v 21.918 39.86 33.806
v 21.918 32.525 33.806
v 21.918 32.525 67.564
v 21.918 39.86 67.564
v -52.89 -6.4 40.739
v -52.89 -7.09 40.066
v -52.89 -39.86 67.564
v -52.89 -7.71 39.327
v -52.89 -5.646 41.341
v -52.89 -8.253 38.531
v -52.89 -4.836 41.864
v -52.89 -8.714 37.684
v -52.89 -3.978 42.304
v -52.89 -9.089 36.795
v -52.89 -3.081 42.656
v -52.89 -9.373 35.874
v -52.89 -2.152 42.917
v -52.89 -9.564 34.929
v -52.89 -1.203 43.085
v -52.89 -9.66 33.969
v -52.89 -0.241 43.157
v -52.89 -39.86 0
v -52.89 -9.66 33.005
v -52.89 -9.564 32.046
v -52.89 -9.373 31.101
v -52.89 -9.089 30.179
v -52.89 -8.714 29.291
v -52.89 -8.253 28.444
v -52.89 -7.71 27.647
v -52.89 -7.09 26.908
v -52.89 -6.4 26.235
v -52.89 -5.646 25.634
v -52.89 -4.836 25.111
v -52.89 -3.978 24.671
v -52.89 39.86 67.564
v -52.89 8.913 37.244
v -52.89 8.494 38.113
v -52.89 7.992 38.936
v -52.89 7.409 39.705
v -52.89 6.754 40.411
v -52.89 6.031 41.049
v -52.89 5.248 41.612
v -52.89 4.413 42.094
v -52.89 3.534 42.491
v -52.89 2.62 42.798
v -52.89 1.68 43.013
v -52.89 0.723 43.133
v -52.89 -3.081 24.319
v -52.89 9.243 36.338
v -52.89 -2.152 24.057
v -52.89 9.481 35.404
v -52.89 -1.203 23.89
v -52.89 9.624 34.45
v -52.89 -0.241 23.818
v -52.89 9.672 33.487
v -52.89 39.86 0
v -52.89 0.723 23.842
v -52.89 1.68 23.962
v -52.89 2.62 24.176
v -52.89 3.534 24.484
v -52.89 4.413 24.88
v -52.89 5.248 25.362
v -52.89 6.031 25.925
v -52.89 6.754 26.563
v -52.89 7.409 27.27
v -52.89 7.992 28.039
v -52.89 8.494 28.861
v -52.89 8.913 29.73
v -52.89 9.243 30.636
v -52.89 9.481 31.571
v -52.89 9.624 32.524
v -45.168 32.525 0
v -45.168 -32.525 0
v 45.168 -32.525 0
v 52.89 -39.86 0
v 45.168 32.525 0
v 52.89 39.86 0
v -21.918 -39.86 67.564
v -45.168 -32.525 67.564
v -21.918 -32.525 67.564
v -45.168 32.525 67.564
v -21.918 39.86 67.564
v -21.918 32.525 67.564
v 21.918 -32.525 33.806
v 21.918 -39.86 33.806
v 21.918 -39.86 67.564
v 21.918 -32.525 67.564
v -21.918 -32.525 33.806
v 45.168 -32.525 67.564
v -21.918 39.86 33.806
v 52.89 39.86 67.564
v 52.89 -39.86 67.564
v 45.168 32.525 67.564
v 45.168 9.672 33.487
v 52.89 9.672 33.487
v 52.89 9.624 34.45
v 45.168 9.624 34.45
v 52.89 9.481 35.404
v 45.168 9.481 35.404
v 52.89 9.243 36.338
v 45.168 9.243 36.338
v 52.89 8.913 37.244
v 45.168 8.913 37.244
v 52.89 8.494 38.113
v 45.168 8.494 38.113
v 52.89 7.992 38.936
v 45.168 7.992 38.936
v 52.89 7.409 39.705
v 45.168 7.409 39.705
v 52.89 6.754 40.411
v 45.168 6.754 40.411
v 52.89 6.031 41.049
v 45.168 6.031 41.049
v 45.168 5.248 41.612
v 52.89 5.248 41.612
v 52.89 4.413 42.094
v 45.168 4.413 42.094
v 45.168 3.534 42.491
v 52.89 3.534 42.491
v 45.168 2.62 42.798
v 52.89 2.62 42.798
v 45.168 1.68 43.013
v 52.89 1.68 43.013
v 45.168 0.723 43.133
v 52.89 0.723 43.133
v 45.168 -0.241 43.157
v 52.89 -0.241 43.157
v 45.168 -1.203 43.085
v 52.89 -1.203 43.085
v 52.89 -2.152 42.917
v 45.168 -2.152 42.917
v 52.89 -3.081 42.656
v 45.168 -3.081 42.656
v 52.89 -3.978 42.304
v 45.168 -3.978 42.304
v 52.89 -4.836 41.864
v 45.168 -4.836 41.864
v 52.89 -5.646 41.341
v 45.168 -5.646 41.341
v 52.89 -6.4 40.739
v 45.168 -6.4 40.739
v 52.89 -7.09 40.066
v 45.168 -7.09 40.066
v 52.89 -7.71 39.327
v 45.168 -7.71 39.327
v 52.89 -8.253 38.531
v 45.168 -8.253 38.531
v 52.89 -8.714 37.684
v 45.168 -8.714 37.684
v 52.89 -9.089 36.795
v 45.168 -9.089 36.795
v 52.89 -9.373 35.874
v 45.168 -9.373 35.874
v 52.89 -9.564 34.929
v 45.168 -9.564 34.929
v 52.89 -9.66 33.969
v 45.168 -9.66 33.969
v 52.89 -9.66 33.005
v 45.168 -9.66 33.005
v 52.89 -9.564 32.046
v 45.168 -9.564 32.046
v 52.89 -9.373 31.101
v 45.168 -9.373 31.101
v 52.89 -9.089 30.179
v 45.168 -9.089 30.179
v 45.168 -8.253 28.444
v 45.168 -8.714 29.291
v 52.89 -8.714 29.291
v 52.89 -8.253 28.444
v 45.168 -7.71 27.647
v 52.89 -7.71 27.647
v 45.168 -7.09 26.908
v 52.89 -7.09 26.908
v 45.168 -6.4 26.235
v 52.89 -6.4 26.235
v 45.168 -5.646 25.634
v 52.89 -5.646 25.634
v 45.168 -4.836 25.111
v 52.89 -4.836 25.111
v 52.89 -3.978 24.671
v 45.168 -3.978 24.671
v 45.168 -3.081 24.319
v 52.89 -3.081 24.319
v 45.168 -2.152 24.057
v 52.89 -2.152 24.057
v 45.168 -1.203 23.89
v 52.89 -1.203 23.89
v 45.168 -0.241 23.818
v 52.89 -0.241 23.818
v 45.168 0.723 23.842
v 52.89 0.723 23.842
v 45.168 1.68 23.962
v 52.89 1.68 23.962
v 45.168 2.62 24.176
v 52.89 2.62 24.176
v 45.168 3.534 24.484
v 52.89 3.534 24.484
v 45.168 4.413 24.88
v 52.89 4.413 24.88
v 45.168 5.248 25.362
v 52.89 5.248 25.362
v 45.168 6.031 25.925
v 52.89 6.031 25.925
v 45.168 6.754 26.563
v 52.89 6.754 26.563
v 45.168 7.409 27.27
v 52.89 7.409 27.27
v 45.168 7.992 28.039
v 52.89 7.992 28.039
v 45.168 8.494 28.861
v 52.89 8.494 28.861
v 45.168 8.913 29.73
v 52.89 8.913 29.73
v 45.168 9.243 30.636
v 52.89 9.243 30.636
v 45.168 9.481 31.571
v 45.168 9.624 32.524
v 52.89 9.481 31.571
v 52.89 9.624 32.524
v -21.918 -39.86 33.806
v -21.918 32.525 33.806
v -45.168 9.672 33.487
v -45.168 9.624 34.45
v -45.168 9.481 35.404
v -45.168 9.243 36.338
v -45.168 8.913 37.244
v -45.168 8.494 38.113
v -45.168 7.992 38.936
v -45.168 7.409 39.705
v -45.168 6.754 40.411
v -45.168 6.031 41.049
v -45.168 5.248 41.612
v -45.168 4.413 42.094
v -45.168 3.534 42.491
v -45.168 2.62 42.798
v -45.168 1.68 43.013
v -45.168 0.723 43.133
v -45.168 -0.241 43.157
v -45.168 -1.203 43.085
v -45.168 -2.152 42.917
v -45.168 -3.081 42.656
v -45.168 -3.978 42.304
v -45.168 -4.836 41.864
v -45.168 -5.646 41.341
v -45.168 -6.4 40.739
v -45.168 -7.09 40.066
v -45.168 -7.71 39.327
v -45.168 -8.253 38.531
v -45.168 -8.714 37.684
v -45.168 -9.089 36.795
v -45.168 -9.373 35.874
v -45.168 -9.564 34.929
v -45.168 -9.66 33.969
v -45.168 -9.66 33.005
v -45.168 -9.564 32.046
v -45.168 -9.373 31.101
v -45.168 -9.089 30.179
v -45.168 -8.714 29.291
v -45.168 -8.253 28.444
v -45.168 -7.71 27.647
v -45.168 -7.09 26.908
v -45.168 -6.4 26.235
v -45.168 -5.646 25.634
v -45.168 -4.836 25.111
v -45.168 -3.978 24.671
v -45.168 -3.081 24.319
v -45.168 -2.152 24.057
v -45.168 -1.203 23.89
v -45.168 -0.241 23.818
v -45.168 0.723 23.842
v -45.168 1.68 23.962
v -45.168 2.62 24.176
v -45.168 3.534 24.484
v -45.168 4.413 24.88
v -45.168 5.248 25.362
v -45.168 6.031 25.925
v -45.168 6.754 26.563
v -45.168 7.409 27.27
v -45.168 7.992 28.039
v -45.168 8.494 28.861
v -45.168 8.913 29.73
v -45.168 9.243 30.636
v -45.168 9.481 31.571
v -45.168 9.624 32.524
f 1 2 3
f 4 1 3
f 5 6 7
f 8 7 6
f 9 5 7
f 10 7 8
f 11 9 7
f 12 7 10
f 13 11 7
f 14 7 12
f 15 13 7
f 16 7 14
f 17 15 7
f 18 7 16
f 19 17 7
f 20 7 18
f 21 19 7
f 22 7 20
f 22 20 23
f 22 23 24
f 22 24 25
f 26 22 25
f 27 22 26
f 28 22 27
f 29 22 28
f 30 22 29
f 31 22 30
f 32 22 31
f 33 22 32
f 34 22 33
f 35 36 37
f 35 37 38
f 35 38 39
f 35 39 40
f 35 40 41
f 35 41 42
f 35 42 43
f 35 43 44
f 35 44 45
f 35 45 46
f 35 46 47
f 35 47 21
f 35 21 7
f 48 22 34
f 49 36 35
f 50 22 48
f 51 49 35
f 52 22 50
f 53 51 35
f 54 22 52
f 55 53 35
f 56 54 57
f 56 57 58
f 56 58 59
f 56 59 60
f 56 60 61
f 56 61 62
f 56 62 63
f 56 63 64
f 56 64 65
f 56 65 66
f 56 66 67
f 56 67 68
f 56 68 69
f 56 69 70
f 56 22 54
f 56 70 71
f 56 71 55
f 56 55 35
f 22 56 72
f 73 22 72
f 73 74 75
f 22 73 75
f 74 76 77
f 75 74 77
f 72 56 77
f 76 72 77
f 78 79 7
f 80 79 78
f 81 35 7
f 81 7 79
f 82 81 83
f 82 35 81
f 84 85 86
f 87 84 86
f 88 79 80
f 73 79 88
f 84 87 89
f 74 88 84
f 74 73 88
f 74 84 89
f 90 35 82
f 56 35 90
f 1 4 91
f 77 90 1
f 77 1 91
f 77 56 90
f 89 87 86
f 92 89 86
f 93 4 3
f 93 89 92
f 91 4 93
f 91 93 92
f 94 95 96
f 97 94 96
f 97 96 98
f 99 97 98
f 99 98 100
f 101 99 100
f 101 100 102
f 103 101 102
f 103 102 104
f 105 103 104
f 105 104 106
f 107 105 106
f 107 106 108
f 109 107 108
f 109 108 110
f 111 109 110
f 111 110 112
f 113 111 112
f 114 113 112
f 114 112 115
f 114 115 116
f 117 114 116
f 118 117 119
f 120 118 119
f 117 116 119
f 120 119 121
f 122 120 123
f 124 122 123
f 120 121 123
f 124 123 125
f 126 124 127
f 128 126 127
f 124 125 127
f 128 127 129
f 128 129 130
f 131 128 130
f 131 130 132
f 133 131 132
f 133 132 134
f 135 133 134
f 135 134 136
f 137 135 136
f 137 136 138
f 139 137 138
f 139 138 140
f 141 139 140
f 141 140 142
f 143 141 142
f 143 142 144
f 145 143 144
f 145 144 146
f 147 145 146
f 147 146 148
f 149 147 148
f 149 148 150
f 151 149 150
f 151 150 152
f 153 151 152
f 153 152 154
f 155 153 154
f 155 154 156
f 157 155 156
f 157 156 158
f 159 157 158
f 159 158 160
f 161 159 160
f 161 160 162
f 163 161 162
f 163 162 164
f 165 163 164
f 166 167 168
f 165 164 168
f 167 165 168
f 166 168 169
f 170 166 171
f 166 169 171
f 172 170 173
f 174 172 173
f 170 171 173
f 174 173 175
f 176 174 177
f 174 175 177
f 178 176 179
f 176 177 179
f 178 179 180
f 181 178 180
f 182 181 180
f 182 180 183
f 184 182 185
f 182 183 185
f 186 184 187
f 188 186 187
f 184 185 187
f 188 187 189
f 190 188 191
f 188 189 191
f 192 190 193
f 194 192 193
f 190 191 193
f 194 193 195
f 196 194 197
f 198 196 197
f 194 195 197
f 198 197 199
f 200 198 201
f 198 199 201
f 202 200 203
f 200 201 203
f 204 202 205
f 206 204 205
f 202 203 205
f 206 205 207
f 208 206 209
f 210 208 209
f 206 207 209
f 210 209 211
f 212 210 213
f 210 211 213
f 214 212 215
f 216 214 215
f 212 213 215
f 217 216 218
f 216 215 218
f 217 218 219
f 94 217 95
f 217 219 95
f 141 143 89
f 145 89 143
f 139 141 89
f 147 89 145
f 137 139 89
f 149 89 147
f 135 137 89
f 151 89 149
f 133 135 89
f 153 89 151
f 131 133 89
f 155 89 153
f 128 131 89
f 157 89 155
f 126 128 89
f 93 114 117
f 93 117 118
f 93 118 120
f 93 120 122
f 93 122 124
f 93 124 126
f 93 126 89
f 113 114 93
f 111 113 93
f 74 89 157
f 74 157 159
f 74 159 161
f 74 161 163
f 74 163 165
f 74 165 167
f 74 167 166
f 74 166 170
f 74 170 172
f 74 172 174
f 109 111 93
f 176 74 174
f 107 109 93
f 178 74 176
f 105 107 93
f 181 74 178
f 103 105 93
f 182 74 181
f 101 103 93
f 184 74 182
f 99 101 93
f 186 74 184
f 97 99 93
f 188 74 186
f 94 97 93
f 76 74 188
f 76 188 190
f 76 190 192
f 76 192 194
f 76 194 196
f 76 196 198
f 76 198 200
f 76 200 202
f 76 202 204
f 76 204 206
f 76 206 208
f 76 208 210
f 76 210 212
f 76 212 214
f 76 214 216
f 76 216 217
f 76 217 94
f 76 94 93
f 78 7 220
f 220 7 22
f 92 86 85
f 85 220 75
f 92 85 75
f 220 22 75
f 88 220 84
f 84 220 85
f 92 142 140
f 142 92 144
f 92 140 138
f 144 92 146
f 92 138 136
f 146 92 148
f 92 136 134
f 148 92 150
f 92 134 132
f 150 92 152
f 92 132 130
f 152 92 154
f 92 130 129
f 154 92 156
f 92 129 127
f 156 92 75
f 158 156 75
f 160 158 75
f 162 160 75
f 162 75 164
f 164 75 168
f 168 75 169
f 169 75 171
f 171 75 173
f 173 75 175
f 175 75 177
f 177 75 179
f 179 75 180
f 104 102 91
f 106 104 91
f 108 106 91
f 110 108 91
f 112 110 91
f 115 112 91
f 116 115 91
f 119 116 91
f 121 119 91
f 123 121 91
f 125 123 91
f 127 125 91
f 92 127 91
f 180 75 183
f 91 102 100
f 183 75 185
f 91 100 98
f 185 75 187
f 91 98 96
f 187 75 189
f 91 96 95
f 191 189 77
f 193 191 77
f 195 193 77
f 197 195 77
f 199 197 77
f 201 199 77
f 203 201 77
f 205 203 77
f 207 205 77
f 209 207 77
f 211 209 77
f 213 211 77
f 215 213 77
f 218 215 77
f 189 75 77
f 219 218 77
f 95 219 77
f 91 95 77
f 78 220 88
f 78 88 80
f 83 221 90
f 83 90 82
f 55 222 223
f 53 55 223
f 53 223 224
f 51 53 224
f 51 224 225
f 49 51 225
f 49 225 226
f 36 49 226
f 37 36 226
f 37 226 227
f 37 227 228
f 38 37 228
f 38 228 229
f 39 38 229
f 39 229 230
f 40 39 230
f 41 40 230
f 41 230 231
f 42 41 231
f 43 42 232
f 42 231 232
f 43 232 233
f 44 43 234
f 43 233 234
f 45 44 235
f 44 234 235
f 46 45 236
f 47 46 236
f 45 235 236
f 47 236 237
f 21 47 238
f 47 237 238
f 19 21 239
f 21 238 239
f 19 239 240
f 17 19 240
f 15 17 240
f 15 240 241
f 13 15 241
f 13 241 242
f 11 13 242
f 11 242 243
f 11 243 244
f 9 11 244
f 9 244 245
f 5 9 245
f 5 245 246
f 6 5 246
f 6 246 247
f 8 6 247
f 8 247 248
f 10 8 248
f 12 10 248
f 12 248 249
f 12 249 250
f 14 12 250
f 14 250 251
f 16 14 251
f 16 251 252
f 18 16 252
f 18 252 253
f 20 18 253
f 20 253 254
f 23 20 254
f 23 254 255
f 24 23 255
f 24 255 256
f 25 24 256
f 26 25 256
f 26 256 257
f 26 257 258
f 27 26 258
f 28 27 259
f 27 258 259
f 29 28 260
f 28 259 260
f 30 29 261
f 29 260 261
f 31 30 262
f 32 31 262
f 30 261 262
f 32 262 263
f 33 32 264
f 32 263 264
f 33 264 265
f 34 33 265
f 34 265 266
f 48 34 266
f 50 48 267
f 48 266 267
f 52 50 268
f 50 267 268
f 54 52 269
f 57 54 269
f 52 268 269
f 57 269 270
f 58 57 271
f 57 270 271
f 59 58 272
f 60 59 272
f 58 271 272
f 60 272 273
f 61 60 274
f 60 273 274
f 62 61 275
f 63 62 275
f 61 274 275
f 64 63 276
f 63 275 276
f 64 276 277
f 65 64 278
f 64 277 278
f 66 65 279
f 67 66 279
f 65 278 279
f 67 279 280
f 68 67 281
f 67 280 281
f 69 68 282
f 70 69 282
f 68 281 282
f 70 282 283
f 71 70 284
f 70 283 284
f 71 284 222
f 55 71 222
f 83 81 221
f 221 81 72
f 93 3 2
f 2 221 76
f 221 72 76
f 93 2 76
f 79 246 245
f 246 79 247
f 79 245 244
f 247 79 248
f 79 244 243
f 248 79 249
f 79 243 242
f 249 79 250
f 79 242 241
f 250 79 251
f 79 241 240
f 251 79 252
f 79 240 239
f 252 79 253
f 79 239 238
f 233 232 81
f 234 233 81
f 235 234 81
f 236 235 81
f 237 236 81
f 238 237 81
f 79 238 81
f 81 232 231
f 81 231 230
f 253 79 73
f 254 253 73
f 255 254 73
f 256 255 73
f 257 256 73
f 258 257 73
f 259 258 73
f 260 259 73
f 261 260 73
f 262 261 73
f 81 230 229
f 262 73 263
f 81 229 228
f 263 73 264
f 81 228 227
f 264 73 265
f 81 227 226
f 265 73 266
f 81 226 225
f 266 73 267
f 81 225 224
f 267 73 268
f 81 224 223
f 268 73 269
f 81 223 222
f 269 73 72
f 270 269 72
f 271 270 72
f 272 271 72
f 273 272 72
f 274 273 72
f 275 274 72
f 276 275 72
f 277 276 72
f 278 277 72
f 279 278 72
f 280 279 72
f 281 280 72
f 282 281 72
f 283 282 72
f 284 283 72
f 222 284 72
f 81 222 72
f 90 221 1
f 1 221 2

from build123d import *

# Parameters (mm, degrees)
F0_W     = 105.7792007923
F0_H     = 79.7204598784
F0_W_2   = 90.3369858861
F0_H_2   = 65.0503486395
F1_DEPTH = 67.564
F2_W     = 43.8358001411
F2_H     = 33.7584646449
F3_DEPTH = 96.012
F4_R     = 9.6723299626
F5_DEPTH = 129.032


with BuildPart() as f1:
    # F0 (on Top) → F1 (new body)
    with BuildSketch(Plane.XY):
        Rectangle(F0_W, F0_H)
        Rectangle(F0_W_2, F0_H_2, mode=Mode.SUBTRACT)
    extrude(amount=F1_DEPTH)

    # F2 (on face) → F3 (cut)
    with BuildSketch(Plane.XZ.offset(39.8602299392)):
        with Locations((0, 50.6847676775)):
            Rectangle(F2_W, F2_H)
    extrude(amount=-F3_DEPTH, mode=Mode.SUBTRACT)

    # F4 (on face) → F5 (cut)
    with BuildSketch(Plane.YZ.offset(52.8896003962)):
        with Locations((0, 33.4872640669)):
            Circle(F4_R)
    extrude(amount=-F5_DEPTH, mode=Mode.SUBTRACT)


solid = f1.part
